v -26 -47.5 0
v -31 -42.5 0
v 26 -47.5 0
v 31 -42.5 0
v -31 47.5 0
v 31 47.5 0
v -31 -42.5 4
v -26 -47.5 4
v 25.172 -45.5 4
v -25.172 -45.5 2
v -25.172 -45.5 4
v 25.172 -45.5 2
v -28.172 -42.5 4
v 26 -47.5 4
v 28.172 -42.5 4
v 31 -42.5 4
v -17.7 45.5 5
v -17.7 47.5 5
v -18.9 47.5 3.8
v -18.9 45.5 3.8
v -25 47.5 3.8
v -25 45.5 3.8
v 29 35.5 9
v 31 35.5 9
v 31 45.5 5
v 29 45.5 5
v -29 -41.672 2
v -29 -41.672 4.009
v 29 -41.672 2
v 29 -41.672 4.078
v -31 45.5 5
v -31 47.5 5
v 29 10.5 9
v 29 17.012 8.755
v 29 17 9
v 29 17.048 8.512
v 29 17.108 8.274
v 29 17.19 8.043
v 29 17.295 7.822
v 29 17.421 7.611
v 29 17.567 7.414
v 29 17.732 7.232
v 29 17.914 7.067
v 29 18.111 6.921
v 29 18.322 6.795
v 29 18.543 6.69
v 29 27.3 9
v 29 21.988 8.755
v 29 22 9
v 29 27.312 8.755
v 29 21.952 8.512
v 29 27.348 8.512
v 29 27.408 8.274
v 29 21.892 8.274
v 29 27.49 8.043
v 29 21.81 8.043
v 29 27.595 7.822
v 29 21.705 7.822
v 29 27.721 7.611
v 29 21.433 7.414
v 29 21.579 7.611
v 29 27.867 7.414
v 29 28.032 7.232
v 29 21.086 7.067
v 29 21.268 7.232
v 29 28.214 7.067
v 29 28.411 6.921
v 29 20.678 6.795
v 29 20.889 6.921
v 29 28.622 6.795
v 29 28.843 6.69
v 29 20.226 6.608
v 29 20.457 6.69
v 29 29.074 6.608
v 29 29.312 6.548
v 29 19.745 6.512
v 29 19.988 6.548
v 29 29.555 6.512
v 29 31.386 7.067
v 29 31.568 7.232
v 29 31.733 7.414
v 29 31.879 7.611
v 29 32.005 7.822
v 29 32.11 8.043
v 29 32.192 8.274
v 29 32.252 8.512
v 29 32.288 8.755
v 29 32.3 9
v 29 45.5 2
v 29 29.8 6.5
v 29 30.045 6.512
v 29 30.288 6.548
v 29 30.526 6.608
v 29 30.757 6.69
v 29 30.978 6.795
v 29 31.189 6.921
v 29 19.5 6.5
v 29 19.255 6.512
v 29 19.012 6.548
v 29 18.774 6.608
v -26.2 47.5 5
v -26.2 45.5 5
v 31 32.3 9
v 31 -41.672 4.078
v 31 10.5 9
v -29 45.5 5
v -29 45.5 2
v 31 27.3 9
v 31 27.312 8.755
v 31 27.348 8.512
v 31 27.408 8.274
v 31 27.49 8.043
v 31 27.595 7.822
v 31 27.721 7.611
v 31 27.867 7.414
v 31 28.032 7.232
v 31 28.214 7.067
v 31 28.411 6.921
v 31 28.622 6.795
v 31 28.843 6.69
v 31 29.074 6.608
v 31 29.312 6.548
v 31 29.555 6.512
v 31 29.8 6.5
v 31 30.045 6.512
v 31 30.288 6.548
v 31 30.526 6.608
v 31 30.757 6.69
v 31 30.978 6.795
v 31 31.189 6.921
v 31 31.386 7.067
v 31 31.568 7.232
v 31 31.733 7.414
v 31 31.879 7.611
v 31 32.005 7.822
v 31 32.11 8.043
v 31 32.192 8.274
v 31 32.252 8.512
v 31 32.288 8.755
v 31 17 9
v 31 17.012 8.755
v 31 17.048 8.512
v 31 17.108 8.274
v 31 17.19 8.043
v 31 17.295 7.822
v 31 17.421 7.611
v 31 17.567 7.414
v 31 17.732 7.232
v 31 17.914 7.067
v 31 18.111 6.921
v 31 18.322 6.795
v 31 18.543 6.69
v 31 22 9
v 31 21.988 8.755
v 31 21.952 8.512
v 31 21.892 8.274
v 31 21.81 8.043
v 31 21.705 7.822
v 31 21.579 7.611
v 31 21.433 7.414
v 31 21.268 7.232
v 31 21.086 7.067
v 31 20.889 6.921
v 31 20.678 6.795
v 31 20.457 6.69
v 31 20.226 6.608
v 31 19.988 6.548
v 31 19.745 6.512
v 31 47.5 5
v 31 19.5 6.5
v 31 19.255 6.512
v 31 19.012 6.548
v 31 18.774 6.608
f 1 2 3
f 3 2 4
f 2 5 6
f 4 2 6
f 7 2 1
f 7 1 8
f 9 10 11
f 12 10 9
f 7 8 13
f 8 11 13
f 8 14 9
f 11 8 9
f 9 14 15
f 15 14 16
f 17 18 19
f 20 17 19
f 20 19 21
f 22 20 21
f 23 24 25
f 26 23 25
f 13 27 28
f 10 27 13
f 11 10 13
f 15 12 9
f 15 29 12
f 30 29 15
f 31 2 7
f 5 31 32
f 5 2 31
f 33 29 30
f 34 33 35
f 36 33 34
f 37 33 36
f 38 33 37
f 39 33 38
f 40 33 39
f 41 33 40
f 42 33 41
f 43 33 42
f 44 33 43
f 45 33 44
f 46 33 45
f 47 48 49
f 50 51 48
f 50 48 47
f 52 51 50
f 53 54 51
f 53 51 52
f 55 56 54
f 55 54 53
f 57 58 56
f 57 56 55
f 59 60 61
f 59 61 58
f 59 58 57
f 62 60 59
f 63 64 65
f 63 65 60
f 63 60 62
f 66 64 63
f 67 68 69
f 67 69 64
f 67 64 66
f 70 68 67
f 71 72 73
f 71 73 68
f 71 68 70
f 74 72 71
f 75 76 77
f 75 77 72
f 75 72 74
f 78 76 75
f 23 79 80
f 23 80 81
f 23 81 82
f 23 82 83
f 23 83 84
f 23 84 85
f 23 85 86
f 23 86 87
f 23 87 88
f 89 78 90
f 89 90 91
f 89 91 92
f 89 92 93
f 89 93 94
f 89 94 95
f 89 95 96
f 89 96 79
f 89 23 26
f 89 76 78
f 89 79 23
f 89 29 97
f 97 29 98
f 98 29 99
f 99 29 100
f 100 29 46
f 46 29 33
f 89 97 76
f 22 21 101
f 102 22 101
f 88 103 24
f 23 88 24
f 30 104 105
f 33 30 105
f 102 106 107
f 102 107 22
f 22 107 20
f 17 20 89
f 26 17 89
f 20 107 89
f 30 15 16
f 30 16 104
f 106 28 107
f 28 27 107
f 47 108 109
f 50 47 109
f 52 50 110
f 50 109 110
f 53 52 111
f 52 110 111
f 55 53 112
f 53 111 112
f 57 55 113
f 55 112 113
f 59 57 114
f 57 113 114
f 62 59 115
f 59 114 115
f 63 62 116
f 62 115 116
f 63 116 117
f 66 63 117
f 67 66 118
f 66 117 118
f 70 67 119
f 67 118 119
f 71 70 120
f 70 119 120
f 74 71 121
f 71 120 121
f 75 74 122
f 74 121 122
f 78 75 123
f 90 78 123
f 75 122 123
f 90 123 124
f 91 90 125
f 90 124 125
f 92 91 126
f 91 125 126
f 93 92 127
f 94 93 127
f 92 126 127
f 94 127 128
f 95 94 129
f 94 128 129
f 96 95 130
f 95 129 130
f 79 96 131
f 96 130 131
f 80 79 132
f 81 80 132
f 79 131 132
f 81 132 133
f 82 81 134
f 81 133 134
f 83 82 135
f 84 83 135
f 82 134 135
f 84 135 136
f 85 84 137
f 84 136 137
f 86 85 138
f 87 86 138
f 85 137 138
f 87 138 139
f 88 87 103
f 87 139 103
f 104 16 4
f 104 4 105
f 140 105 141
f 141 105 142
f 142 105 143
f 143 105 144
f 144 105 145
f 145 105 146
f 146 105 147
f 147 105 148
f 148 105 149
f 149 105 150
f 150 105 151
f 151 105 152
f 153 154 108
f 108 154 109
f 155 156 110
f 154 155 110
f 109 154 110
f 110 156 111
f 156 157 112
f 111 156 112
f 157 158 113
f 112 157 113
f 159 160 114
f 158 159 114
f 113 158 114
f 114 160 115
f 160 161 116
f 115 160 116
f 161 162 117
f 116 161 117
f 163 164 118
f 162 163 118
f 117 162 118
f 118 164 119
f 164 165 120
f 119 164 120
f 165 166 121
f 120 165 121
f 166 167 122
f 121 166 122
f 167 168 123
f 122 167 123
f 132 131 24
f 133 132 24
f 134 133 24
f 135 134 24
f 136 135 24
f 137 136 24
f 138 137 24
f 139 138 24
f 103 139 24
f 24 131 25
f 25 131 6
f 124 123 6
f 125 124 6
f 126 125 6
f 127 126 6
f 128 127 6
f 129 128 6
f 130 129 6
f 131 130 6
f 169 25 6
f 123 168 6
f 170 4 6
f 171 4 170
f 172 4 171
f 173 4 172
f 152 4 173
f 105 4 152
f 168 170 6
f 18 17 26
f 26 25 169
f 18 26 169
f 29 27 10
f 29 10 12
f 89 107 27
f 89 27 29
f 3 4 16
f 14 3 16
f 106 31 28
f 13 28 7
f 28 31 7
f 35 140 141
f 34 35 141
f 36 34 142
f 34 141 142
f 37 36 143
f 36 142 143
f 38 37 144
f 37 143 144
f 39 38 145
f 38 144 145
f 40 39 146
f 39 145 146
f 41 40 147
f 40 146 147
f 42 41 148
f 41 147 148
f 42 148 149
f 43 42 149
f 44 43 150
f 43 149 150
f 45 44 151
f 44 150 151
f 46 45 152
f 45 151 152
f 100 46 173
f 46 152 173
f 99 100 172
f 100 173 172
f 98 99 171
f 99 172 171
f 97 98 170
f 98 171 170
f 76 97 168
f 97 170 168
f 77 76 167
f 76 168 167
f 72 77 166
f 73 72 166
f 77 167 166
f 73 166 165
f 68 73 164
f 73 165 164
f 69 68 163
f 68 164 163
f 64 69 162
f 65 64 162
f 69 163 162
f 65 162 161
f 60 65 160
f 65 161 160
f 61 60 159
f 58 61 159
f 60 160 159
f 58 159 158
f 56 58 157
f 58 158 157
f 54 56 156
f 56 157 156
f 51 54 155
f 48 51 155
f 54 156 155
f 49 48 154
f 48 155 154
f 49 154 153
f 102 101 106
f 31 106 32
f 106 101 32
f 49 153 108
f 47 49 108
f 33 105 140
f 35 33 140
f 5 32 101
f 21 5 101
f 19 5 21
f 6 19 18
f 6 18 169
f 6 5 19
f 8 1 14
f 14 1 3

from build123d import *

# Parameters (mm, degrees)
F0_W      = 62
F0_H      = 95
F1_DEPTH  = 9
F2_SIZE   = 5
F3_T      = -2
F5_DEPTH  = 2
F7_DEPTH  = 2
F8_DEPTH  = 25
F10_DEPTH = 90
F12_DEPTH = 3


with BuildPart() as f1:
    # F0 (on Top) → F1 (new body)
    with BuildSketch(Plane.XY):
        Rectangle(F0_W, F0_H)
    extrude(amount=F1_DEPTH)

    # F2
    f2_edges = [f1.edges().sort_by_distance(p)[0] for p in [
        (-31, -47.5, 4.5),
        (31, -47.5, 4.5),
    ]]
    chamfer(f2_edges, length=F2_SIZE)

    # F3
    f3_openings = [f1.faces().sort_by_distance(p)[0] for p in [
        (0, 0.195368, 9),
    ]]
    offset(amount=F3_T, openings=f3_openings)

    # F4 (on face) → F5 (cut)
    with BuildSketch(Plane.YZ.offset(31)):
        with BuildLine():
            ThreePointArc((27.3, 9), (29.8, 6.5), (32.3, 9))
            Line((32.3, 9), (35.5, 9))
            Line((35.5, 9), (45.5, 5))
            Line((45.5, 5), (47.5, 5))
            Line((47.5, 5), (47.5, 10))
            Line((47.5, 10), (-47.5, 10))
            Line((-47.5, 10), (-47.5, 4))
            Line((-47.5, 4), (-42.5, 4))
            Line((-42.5, 4), (10.5, 9))
            Line((10.5, 9), (17, 9))
            ThreePointArc((17, 9), (19.5, 6.5), (22, 9))
            Line((22, 9), (27.3, 9))
        make_face()
    extrude(amount=-F5_DEPTH, mode=Mode.SUBTRACT)

    # F6 (on face) → F7 (cut)
    with BuildSketch(Plane(origin=(0, 47.5, 0), x_dir=(-1, 0, 0), z_dir=(0, 1, 0))):
        Polygon((-29, 9), (-29, 5), (-25.9392373264, 5), (17.7, 5), (18.9, 3.8), (25, 3.8), (26.2, 5), (31, 5), (31, 9), align=None)
    extrude(amount=-F7_DEPTH, mode=Mode.SUBTRACT)

    # F8 (add): a face of the model
    f8_faces = [f1.faces().sort_by_distance(p)[0] for p in [
        (29, -43.0883975313, 6.5056760177),
    ]]
    extrude(f8_faces, amount=F8_DEPTH)

    # F9 (on face) → F10 (cut)
    with BuildSketch(Plane.YZ.offset(54)):
        Polygon((-42.5, 4), (-41.6715728753, 4.0781535023), (-41.6715728753, 9.3699973077), (-47.5018471479, 9.3699973077), (-47.5018471479, 4), align=None)
    extrude(amount=-F10_DEPTH, mode=Mode.SUBTRACT)

    # F11 (on face) → F12 (cut)
    with BuildSketch(Plane(origin=(-31, 0, 0), x_dir=(0, -1, 0), z_dir=(-1, 0, 0))):
        Polygon((-45.5, 9), (-45.5, 5), (42.5, 4), (42.5568181818, 9), align=None)
    extrude(amount=-F12_DEPTH, mode=Mode.SUBTRACT)


solid = f1.part
